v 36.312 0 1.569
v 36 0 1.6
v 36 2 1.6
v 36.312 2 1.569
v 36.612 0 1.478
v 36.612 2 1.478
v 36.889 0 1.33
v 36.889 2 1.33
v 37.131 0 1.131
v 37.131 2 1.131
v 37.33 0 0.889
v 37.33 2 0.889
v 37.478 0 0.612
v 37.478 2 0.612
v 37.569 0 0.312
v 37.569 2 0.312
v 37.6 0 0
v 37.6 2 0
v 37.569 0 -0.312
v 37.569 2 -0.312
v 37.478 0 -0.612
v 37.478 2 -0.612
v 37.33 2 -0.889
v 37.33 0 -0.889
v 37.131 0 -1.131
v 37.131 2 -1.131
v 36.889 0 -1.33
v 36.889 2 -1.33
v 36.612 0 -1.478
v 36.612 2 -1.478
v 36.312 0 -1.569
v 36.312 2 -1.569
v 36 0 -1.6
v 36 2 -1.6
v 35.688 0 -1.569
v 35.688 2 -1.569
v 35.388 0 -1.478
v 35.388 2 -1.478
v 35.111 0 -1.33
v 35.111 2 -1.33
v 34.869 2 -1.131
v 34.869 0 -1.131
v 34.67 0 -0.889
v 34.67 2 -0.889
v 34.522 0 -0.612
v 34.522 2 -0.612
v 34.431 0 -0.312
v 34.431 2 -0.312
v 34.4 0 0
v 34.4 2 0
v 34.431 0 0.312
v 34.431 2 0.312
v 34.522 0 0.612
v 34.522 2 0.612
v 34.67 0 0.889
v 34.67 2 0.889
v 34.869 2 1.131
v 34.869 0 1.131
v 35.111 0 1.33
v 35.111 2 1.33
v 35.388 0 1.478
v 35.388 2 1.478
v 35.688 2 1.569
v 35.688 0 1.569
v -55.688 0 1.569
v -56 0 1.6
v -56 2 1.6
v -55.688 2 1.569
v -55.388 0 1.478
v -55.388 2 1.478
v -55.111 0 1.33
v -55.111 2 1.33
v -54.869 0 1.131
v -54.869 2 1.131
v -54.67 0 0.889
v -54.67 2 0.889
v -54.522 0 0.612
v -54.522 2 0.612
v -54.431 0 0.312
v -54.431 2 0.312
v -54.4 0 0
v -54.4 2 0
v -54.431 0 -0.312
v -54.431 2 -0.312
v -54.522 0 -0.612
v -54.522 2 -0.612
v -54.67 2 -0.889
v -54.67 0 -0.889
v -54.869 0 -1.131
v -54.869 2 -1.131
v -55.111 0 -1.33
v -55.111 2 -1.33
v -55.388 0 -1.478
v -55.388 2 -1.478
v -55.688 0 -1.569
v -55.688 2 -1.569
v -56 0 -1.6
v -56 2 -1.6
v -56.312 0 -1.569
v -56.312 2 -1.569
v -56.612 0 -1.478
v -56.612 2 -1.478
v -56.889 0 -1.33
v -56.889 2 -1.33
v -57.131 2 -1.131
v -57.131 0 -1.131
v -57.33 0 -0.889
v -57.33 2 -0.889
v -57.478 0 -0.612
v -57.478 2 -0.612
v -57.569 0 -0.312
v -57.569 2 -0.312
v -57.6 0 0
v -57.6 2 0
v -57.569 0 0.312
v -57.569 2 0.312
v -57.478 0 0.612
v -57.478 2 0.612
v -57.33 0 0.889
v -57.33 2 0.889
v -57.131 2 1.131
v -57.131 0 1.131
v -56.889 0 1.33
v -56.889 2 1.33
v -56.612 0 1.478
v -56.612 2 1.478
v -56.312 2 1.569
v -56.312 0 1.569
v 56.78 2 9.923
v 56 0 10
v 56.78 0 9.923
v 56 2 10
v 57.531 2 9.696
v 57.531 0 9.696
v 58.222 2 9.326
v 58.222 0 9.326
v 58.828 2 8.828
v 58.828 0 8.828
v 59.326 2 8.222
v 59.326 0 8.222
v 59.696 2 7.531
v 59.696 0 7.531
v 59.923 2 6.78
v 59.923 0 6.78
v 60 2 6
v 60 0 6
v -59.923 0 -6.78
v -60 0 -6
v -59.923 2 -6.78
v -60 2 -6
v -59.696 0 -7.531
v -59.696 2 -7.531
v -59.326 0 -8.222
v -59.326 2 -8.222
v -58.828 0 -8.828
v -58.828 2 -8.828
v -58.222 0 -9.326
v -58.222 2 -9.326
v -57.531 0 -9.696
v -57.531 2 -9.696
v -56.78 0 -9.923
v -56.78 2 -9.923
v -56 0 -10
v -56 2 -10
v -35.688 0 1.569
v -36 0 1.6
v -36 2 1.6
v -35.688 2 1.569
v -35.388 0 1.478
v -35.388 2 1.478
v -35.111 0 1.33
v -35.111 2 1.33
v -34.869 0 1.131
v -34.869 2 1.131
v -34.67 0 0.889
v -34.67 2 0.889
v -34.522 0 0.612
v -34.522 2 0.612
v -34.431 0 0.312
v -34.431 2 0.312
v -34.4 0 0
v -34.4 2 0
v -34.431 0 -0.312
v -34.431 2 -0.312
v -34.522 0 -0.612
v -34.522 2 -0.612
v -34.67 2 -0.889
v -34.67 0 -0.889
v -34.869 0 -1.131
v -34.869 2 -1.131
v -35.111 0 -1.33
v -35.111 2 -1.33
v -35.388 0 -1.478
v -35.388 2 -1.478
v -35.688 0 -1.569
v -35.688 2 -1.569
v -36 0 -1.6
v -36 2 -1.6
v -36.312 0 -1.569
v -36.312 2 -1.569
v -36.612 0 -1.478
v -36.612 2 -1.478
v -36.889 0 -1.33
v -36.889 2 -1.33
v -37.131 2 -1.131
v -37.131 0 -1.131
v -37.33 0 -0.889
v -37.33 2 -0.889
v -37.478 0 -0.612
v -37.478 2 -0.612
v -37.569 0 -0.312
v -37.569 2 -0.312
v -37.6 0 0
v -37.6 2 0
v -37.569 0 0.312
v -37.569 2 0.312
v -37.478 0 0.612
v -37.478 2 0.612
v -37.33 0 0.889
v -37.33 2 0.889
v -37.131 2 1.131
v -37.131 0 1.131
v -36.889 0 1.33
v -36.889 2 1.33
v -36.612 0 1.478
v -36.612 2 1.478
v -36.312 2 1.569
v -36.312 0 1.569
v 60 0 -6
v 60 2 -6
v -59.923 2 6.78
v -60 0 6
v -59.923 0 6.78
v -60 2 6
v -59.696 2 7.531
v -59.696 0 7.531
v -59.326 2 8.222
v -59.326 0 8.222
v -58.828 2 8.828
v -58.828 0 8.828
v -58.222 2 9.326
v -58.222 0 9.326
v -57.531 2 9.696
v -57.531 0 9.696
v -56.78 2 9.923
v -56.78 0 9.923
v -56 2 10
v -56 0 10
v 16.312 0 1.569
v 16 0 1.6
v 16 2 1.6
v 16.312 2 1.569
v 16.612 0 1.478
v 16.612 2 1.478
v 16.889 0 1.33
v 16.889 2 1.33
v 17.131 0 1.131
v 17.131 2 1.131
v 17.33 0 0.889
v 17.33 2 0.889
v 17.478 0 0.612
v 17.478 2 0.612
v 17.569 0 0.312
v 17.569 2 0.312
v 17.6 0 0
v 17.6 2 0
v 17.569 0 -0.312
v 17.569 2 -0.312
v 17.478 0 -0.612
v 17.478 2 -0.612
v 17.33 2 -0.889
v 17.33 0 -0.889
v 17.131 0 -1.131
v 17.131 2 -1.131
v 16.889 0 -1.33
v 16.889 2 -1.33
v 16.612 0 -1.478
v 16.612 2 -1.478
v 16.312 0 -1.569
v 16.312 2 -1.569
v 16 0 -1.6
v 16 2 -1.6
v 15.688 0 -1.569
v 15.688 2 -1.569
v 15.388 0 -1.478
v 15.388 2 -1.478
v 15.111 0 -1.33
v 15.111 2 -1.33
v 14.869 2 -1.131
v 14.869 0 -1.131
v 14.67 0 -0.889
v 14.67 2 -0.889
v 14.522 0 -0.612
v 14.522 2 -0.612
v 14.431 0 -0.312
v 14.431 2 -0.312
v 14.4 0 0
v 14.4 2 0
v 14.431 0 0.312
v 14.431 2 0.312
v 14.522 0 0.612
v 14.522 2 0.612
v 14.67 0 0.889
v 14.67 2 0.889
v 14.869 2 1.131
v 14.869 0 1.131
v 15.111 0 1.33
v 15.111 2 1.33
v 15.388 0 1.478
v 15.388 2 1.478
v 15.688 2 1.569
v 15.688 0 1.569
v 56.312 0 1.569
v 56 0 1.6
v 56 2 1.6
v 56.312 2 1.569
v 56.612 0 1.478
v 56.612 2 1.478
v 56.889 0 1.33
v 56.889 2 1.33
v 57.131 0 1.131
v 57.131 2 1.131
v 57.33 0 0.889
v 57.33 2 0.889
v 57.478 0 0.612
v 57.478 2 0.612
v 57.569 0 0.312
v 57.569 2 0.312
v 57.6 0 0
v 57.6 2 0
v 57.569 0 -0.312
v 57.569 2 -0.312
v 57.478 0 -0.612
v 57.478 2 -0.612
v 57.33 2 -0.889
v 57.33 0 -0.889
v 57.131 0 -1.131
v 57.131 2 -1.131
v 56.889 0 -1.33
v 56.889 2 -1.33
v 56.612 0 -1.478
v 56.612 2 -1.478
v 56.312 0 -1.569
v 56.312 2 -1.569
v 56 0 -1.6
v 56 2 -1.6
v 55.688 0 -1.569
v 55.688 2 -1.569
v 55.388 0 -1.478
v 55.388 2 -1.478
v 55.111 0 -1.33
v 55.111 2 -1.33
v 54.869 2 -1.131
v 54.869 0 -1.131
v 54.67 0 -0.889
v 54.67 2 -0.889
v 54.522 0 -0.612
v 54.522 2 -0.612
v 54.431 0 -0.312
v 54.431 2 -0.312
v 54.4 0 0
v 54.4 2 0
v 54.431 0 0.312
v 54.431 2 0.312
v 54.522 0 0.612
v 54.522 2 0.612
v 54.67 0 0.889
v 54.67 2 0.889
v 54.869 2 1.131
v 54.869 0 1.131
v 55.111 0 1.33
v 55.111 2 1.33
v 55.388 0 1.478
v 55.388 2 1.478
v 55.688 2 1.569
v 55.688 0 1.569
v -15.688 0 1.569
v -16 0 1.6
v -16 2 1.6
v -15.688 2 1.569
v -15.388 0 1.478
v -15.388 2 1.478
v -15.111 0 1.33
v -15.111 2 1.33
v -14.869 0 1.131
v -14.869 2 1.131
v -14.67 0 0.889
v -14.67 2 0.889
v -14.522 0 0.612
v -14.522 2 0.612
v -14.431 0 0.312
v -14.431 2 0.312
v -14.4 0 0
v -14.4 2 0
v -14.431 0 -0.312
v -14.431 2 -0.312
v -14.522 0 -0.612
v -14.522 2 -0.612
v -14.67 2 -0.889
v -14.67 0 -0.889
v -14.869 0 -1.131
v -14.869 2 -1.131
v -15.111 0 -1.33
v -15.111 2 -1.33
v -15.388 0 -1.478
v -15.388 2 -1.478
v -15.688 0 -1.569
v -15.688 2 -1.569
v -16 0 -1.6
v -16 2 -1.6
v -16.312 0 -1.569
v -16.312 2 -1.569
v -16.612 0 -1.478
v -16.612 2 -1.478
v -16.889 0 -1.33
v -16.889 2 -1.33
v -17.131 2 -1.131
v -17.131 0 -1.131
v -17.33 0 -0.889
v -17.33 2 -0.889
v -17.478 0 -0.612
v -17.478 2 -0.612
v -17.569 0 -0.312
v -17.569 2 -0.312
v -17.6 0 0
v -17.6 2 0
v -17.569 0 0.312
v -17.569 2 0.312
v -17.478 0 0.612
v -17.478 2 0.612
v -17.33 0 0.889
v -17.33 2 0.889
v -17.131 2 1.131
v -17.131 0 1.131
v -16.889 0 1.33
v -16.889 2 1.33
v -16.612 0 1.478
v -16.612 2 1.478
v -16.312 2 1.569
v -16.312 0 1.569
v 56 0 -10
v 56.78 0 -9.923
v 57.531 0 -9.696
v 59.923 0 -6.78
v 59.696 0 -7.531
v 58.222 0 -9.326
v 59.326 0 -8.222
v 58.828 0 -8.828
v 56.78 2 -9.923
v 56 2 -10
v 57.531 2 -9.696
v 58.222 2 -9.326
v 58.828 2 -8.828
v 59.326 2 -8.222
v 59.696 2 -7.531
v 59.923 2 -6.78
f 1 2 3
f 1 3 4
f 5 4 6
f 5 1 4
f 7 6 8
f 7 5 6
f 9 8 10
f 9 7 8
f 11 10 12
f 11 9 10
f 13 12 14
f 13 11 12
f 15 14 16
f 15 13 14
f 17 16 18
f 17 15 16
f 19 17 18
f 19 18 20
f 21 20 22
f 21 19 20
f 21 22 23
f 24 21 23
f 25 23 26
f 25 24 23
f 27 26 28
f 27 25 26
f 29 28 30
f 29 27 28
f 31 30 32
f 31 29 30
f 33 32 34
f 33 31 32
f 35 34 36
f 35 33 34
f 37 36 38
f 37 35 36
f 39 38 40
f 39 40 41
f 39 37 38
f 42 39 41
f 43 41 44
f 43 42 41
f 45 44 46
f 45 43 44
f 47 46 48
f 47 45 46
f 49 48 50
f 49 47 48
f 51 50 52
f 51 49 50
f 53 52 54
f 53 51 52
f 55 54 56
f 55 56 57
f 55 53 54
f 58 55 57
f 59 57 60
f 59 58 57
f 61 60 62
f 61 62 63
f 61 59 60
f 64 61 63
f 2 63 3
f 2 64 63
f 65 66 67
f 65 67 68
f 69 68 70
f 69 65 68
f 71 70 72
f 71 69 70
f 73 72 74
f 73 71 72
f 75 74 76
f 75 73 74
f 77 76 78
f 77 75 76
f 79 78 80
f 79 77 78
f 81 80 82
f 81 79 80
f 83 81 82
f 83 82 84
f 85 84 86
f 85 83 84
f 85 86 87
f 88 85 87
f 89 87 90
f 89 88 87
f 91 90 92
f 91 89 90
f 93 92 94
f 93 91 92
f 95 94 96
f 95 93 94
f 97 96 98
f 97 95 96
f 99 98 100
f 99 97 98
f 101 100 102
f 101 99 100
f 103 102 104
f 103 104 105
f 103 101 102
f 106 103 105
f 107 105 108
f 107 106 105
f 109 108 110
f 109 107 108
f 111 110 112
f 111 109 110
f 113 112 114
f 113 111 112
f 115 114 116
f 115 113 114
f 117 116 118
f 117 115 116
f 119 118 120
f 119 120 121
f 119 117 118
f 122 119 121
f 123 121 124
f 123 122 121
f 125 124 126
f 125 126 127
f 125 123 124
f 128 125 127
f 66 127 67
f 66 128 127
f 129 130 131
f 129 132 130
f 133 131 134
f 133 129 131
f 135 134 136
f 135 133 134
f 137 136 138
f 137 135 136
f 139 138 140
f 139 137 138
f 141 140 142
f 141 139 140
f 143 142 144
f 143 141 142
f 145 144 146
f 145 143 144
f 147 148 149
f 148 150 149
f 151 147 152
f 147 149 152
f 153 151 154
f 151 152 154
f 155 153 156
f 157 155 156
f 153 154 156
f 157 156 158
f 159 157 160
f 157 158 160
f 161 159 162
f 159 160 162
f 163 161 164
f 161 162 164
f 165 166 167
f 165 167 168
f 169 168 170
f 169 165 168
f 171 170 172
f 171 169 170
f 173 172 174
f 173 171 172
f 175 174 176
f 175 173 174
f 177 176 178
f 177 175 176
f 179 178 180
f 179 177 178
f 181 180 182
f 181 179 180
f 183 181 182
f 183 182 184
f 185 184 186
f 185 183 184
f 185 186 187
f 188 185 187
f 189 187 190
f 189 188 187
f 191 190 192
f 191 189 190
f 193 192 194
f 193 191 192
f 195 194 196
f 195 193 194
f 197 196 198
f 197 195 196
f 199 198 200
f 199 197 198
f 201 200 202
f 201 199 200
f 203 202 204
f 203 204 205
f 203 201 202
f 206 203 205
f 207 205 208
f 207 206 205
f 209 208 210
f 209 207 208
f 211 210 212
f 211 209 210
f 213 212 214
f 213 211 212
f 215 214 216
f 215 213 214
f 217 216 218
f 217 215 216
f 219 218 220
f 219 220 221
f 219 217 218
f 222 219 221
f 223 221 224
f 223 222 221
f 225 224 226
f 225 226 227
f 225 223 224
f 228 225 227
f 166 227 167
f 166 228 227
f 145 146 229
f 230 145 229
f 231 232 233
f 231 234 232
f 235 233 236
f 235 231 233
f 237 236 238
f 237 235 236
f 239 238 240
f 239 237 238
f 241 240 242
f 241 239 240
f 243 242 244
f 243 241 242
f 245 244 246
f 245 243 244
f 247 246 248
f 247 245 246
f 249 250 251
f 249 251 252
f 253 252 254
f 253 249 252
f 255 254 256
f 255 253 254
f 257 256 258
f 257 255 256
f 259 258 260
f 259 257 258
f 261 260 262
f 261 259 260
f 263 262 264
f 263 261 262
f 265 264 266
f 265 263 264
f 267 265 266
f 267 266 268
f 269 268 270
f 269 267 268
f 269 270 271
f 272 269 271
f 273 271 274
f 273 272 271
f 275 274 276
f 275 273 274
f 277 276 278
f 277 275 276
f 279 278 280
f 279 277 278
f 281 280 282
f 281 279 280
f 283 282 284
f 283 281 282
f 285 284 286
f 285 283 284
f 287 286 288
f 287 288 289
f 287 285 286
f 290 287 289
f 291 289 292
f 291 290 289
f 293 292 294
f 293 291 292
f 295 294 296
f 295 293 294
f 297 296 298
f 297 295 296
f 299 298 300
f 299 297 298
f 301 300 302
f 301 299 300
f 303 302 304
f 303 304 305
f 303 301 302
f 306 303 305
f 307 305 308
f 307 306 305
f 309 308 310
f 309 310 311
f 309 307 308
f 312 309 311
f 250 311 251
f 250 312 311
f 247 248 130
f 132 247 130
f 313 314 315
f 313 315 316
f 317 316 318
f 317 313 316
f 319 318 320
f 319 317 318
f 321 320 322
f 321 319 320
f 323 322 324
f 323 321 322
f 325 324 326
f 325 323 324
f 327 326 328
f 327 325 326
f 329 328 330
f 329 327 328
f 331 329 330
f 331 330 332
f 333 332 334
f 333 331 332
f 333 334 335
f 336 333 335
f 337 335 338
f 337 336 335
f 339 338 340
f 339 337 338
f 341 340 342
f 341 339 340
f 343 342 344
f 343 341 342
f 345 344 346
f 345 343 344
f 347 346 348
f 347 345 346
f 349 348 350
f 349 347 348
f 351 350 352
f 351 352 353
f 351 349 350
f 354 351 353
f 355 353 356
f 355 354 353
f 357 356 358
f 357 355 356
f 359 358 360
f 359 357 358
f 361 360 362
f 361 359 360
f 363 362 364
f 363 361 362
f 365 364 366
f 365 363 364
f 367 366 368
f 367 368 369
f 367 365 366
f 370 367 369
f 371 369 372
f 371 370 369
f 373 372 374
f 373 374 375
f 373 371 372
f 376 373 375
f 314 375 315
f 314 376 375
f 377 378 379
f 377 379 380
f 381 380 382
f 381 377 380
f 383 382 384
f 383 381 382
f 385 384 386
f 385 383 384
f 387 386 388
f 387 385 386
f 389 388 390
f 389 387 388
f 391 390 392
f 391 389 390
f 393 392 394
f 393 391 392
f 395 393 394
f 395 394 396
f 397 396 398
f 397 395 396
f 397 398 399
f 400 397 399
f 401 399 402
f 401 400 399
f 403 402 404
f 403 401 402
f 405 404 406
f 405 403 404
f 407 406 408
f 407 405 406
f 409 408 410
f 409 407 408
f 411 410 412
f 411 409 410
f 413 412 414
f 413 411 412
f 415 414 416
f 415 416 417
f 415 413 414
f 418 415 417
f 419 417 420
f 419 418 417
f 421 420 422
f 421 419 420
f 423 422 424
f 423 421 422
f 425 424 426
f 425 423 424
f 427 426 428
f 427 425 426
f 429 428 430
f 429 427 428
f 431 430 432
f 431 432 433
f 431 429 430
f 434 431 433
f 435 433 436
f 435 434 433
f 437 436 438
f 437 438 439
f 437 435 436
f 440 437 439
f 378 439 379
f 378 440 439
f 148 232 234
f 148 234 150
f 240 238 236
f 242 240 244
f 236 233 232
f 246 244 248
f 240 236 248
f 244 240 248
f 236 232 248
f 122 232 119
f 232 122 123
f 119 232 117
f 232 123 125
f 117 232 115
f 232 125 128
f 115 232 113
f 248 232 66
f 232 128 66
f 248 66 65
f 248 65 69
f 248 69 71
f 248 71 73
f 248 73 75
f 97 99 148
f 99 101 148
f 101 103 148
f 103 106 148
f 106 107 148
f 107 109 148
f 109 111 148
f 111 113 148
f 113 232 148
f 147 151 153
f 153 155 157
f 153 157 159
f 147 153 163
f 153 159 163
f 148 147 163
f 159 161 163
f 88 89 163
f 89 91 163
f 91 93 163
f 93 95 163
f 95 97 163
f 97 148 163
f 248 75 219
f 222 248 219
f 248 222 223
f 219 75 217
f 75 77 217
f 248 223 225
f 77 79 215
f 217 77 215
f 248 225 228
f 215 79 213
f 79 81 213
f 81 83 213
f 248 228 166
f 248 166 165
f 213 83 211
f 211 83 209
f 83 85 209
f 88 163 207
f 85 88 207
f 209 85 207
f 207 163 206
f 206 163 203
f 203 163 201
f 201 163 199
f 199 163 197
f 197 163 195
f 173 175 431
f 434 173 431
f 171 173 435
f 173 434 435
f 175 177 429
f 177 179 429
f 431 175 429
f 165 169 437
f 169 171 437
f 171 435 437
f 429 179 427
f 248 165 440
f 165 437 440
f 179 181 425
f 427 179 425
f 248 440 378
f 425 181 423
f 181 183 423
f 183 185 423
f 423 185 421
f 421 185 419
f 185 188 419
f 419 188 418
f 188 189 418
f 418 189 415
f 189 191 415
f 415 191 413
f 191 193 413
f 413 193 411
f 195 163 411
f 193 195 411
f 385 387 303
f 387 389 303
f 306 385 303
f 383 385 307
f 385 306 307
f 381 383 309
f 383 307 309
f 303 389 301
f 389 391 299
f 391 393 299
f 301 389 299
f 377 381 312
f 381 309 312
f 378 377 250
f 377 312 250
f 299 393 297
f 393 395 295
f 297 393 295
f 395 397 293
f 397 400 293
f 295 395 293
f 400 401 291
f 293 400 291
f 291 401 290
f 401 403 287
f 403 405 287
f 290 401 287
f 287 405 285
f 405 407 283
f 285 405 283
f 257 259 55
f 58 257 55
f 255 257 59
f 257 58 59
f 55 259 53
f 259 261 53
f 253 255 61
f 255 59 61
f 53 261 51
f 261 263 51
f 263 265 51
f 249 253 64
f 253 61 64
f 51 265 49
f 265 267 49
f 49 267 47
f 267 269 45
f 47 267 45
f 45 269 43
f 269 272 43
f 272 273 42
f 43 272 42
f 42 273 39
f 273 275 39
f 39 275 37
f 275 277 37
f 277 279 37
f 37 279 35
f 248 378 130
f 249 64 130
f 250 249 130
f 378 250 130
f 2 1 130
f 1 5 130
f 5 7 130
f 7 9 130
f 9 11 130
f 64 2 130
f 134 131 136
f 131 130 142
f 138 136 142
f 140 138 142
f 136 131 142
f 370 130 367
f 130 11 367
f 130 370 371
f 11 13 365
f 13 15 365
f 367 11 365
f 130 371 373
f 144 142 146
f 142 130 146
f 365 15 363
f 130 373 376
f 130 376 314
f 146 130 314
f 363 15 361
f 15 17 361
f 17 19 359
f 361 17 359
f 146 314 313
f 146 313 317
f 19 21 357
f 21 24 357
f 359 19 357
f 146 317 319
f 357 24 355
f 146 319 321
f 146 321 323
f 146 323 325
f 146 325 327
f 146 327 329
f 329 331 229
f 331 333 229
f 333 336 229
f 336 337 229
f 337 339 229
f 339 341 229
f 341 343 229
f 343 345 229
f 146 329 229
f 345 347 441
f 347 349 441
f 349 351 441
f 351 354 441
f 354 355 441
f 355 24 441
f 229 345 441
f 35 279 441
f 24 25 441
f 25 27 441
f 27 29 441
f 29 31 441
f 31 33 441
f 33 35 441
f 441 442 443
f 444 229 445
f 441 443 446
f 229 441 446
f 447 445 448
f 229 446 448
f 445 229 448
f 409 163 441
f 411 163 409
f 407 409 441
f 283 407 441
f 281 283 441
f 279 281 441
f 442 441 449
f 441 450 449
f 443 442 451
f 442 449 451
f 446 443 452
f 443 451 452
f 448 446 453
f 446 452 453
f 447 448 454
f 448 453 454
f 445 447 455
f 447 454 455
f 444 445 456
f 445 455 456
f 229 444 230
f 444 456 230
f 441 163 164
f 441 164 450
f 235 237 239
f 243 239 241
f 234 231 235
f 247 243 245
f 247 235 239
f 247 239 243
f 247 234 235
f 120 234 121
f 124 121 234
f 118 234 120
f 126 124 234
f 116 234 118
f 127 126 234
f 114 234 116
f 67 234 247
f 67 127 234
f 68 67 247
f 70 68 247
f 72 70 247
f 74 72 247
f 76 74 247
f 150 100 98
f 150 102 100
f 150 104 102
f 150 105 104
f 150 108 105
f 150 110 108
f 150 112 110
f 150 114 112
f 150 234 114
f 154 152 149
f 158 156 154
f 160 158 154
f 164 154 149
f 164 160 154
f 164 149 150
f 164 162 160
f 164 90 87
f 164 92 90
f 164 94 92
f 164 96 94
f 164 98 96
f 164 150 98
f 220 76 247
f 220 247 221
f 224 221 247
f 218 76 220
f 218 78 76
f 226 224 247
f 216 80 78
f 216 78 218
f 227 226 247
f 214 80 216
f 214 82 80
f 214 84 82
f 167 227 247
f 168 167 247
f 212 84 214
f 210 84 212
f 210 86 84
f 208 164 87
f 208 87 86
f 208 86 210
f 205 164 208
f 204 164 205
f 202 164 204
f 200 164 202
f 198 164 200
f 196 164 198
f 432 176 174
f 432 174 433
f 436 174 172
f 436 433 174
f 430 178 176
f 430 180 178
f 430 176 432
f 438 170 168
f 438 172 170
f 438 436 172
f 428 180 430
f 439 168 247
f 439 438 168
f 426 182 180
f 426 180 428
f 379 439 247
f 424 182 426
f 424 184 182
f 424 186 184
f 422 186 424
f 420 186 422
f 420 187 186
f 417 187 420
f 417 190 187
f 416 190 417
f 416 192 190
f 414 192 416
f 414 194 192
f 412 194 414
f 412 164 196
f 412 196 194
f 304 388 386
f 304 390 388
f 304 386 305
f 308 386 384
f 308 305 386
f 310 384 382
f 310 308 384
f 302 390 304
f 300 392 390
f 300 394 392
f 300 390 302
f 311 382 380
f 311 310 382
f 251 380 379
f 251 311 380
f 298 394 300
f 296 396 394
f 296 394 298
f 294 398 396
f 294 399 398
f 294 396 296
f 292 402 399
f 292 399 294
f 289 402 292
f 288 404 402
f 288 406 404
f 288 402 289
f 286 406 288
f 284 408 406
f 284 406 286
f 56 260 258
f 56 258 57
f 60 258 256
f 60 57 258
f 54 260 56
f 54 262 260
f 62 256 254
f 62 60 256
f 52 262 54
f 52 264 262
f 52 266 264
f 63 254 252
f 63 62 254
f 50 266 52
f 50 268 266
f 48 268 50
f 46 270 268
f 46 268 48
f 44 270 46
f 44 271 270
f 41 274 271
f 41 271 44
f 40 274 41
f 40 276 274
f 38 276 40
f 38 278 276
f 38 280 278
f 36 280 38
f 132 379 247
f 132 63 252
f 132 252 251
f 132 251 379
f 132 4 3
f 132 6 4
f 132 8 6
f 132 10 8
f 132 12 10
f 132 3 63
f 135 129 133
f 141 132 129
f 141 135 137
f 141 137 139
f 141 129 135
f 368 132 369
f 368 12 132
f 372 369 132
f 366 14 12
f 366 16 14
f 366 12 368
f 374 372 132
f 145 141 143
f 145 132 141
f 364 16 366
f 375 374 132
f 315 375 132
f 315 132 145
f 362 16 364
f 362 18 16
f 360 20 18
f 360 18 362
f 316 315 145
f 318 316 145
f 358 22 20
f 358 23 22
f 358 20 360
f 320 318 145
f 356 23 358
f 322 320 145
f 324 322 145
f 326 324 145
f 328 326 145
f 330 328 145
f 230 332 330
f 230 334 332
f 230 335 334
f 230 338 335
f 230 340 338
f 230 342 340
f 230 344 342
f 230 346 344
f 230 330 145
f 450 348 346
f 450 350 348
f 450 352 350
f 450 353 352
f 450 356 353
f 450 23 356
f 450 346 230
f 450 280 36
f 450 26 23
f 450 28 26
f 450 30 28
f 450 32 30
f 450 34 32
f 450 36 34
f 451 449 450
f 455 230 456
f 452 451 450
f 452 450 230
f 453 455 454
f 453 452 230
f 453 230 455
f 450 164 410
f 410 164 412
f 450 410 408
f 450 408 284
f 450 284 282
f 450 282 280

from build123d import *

# Parameters (mm, degrees)
SKETCH_1_W      = 120
SKETCH_1_H      = 20
SKETCH_1_R      = 1.6
EXTRUDE_1_DEPTH = 2
FILLET_1_R      = 4


with BuildPart() as part:
    # 草图1 → 凸台-拉伸1 (new body)
    with BuildSketch(Plane(origin=(0, 0, 0), x_dir=(1, 0, 0), z_dir=(0, 1, 0))):
        Rectangle(SKETCH_1_W, SKETCH_1_H)
        with Locations(Location((16, 0, 0), (0, 0, 270))):
            Circle(SKETCH_1_R, mode=Mode.SUBTRACT)
        with Locations(Location((-16, 0, 0), (0, 0, 270))):
            Circle(SKETCH_1_R, mode=Mode.SUBTRACT)
        with Locations(Location((36, 0, 0), (0, 0, 270))):
            Circle(SKETCH_1_R, mode=Mode.SUBTRACT)
        with Locations(Location((56, 0, 0), (0, 0, 270))):
            Circle(SKETCH_1_R, mode=Mode.SUBTRACT)
        with Locations(Location((-36, 0, 0), (0, 0, 270))):
            Circle(SKETCH_1_R, mode=Mode.SUBTRACT)
        with Locations(Location((-56, 0, 0), (0, 0, 270))):
            Circle(SKETCH_1_R, mode=Mode.SUBTRACT)
    extrude(amount=EXTRUDE_1_DEPTH)

    # 圆角1
    fillet_1_edges = [part.edges().sort_by_distance(p)[0] for p in [
        (60, 1, 10),
        (-60, 1, 10),
        (-60, 1, -10),
        (60, 1, -10),
    ]]
    fillet(fillet_1_edges, radius=FILLET_1_R)


solid = part.part
